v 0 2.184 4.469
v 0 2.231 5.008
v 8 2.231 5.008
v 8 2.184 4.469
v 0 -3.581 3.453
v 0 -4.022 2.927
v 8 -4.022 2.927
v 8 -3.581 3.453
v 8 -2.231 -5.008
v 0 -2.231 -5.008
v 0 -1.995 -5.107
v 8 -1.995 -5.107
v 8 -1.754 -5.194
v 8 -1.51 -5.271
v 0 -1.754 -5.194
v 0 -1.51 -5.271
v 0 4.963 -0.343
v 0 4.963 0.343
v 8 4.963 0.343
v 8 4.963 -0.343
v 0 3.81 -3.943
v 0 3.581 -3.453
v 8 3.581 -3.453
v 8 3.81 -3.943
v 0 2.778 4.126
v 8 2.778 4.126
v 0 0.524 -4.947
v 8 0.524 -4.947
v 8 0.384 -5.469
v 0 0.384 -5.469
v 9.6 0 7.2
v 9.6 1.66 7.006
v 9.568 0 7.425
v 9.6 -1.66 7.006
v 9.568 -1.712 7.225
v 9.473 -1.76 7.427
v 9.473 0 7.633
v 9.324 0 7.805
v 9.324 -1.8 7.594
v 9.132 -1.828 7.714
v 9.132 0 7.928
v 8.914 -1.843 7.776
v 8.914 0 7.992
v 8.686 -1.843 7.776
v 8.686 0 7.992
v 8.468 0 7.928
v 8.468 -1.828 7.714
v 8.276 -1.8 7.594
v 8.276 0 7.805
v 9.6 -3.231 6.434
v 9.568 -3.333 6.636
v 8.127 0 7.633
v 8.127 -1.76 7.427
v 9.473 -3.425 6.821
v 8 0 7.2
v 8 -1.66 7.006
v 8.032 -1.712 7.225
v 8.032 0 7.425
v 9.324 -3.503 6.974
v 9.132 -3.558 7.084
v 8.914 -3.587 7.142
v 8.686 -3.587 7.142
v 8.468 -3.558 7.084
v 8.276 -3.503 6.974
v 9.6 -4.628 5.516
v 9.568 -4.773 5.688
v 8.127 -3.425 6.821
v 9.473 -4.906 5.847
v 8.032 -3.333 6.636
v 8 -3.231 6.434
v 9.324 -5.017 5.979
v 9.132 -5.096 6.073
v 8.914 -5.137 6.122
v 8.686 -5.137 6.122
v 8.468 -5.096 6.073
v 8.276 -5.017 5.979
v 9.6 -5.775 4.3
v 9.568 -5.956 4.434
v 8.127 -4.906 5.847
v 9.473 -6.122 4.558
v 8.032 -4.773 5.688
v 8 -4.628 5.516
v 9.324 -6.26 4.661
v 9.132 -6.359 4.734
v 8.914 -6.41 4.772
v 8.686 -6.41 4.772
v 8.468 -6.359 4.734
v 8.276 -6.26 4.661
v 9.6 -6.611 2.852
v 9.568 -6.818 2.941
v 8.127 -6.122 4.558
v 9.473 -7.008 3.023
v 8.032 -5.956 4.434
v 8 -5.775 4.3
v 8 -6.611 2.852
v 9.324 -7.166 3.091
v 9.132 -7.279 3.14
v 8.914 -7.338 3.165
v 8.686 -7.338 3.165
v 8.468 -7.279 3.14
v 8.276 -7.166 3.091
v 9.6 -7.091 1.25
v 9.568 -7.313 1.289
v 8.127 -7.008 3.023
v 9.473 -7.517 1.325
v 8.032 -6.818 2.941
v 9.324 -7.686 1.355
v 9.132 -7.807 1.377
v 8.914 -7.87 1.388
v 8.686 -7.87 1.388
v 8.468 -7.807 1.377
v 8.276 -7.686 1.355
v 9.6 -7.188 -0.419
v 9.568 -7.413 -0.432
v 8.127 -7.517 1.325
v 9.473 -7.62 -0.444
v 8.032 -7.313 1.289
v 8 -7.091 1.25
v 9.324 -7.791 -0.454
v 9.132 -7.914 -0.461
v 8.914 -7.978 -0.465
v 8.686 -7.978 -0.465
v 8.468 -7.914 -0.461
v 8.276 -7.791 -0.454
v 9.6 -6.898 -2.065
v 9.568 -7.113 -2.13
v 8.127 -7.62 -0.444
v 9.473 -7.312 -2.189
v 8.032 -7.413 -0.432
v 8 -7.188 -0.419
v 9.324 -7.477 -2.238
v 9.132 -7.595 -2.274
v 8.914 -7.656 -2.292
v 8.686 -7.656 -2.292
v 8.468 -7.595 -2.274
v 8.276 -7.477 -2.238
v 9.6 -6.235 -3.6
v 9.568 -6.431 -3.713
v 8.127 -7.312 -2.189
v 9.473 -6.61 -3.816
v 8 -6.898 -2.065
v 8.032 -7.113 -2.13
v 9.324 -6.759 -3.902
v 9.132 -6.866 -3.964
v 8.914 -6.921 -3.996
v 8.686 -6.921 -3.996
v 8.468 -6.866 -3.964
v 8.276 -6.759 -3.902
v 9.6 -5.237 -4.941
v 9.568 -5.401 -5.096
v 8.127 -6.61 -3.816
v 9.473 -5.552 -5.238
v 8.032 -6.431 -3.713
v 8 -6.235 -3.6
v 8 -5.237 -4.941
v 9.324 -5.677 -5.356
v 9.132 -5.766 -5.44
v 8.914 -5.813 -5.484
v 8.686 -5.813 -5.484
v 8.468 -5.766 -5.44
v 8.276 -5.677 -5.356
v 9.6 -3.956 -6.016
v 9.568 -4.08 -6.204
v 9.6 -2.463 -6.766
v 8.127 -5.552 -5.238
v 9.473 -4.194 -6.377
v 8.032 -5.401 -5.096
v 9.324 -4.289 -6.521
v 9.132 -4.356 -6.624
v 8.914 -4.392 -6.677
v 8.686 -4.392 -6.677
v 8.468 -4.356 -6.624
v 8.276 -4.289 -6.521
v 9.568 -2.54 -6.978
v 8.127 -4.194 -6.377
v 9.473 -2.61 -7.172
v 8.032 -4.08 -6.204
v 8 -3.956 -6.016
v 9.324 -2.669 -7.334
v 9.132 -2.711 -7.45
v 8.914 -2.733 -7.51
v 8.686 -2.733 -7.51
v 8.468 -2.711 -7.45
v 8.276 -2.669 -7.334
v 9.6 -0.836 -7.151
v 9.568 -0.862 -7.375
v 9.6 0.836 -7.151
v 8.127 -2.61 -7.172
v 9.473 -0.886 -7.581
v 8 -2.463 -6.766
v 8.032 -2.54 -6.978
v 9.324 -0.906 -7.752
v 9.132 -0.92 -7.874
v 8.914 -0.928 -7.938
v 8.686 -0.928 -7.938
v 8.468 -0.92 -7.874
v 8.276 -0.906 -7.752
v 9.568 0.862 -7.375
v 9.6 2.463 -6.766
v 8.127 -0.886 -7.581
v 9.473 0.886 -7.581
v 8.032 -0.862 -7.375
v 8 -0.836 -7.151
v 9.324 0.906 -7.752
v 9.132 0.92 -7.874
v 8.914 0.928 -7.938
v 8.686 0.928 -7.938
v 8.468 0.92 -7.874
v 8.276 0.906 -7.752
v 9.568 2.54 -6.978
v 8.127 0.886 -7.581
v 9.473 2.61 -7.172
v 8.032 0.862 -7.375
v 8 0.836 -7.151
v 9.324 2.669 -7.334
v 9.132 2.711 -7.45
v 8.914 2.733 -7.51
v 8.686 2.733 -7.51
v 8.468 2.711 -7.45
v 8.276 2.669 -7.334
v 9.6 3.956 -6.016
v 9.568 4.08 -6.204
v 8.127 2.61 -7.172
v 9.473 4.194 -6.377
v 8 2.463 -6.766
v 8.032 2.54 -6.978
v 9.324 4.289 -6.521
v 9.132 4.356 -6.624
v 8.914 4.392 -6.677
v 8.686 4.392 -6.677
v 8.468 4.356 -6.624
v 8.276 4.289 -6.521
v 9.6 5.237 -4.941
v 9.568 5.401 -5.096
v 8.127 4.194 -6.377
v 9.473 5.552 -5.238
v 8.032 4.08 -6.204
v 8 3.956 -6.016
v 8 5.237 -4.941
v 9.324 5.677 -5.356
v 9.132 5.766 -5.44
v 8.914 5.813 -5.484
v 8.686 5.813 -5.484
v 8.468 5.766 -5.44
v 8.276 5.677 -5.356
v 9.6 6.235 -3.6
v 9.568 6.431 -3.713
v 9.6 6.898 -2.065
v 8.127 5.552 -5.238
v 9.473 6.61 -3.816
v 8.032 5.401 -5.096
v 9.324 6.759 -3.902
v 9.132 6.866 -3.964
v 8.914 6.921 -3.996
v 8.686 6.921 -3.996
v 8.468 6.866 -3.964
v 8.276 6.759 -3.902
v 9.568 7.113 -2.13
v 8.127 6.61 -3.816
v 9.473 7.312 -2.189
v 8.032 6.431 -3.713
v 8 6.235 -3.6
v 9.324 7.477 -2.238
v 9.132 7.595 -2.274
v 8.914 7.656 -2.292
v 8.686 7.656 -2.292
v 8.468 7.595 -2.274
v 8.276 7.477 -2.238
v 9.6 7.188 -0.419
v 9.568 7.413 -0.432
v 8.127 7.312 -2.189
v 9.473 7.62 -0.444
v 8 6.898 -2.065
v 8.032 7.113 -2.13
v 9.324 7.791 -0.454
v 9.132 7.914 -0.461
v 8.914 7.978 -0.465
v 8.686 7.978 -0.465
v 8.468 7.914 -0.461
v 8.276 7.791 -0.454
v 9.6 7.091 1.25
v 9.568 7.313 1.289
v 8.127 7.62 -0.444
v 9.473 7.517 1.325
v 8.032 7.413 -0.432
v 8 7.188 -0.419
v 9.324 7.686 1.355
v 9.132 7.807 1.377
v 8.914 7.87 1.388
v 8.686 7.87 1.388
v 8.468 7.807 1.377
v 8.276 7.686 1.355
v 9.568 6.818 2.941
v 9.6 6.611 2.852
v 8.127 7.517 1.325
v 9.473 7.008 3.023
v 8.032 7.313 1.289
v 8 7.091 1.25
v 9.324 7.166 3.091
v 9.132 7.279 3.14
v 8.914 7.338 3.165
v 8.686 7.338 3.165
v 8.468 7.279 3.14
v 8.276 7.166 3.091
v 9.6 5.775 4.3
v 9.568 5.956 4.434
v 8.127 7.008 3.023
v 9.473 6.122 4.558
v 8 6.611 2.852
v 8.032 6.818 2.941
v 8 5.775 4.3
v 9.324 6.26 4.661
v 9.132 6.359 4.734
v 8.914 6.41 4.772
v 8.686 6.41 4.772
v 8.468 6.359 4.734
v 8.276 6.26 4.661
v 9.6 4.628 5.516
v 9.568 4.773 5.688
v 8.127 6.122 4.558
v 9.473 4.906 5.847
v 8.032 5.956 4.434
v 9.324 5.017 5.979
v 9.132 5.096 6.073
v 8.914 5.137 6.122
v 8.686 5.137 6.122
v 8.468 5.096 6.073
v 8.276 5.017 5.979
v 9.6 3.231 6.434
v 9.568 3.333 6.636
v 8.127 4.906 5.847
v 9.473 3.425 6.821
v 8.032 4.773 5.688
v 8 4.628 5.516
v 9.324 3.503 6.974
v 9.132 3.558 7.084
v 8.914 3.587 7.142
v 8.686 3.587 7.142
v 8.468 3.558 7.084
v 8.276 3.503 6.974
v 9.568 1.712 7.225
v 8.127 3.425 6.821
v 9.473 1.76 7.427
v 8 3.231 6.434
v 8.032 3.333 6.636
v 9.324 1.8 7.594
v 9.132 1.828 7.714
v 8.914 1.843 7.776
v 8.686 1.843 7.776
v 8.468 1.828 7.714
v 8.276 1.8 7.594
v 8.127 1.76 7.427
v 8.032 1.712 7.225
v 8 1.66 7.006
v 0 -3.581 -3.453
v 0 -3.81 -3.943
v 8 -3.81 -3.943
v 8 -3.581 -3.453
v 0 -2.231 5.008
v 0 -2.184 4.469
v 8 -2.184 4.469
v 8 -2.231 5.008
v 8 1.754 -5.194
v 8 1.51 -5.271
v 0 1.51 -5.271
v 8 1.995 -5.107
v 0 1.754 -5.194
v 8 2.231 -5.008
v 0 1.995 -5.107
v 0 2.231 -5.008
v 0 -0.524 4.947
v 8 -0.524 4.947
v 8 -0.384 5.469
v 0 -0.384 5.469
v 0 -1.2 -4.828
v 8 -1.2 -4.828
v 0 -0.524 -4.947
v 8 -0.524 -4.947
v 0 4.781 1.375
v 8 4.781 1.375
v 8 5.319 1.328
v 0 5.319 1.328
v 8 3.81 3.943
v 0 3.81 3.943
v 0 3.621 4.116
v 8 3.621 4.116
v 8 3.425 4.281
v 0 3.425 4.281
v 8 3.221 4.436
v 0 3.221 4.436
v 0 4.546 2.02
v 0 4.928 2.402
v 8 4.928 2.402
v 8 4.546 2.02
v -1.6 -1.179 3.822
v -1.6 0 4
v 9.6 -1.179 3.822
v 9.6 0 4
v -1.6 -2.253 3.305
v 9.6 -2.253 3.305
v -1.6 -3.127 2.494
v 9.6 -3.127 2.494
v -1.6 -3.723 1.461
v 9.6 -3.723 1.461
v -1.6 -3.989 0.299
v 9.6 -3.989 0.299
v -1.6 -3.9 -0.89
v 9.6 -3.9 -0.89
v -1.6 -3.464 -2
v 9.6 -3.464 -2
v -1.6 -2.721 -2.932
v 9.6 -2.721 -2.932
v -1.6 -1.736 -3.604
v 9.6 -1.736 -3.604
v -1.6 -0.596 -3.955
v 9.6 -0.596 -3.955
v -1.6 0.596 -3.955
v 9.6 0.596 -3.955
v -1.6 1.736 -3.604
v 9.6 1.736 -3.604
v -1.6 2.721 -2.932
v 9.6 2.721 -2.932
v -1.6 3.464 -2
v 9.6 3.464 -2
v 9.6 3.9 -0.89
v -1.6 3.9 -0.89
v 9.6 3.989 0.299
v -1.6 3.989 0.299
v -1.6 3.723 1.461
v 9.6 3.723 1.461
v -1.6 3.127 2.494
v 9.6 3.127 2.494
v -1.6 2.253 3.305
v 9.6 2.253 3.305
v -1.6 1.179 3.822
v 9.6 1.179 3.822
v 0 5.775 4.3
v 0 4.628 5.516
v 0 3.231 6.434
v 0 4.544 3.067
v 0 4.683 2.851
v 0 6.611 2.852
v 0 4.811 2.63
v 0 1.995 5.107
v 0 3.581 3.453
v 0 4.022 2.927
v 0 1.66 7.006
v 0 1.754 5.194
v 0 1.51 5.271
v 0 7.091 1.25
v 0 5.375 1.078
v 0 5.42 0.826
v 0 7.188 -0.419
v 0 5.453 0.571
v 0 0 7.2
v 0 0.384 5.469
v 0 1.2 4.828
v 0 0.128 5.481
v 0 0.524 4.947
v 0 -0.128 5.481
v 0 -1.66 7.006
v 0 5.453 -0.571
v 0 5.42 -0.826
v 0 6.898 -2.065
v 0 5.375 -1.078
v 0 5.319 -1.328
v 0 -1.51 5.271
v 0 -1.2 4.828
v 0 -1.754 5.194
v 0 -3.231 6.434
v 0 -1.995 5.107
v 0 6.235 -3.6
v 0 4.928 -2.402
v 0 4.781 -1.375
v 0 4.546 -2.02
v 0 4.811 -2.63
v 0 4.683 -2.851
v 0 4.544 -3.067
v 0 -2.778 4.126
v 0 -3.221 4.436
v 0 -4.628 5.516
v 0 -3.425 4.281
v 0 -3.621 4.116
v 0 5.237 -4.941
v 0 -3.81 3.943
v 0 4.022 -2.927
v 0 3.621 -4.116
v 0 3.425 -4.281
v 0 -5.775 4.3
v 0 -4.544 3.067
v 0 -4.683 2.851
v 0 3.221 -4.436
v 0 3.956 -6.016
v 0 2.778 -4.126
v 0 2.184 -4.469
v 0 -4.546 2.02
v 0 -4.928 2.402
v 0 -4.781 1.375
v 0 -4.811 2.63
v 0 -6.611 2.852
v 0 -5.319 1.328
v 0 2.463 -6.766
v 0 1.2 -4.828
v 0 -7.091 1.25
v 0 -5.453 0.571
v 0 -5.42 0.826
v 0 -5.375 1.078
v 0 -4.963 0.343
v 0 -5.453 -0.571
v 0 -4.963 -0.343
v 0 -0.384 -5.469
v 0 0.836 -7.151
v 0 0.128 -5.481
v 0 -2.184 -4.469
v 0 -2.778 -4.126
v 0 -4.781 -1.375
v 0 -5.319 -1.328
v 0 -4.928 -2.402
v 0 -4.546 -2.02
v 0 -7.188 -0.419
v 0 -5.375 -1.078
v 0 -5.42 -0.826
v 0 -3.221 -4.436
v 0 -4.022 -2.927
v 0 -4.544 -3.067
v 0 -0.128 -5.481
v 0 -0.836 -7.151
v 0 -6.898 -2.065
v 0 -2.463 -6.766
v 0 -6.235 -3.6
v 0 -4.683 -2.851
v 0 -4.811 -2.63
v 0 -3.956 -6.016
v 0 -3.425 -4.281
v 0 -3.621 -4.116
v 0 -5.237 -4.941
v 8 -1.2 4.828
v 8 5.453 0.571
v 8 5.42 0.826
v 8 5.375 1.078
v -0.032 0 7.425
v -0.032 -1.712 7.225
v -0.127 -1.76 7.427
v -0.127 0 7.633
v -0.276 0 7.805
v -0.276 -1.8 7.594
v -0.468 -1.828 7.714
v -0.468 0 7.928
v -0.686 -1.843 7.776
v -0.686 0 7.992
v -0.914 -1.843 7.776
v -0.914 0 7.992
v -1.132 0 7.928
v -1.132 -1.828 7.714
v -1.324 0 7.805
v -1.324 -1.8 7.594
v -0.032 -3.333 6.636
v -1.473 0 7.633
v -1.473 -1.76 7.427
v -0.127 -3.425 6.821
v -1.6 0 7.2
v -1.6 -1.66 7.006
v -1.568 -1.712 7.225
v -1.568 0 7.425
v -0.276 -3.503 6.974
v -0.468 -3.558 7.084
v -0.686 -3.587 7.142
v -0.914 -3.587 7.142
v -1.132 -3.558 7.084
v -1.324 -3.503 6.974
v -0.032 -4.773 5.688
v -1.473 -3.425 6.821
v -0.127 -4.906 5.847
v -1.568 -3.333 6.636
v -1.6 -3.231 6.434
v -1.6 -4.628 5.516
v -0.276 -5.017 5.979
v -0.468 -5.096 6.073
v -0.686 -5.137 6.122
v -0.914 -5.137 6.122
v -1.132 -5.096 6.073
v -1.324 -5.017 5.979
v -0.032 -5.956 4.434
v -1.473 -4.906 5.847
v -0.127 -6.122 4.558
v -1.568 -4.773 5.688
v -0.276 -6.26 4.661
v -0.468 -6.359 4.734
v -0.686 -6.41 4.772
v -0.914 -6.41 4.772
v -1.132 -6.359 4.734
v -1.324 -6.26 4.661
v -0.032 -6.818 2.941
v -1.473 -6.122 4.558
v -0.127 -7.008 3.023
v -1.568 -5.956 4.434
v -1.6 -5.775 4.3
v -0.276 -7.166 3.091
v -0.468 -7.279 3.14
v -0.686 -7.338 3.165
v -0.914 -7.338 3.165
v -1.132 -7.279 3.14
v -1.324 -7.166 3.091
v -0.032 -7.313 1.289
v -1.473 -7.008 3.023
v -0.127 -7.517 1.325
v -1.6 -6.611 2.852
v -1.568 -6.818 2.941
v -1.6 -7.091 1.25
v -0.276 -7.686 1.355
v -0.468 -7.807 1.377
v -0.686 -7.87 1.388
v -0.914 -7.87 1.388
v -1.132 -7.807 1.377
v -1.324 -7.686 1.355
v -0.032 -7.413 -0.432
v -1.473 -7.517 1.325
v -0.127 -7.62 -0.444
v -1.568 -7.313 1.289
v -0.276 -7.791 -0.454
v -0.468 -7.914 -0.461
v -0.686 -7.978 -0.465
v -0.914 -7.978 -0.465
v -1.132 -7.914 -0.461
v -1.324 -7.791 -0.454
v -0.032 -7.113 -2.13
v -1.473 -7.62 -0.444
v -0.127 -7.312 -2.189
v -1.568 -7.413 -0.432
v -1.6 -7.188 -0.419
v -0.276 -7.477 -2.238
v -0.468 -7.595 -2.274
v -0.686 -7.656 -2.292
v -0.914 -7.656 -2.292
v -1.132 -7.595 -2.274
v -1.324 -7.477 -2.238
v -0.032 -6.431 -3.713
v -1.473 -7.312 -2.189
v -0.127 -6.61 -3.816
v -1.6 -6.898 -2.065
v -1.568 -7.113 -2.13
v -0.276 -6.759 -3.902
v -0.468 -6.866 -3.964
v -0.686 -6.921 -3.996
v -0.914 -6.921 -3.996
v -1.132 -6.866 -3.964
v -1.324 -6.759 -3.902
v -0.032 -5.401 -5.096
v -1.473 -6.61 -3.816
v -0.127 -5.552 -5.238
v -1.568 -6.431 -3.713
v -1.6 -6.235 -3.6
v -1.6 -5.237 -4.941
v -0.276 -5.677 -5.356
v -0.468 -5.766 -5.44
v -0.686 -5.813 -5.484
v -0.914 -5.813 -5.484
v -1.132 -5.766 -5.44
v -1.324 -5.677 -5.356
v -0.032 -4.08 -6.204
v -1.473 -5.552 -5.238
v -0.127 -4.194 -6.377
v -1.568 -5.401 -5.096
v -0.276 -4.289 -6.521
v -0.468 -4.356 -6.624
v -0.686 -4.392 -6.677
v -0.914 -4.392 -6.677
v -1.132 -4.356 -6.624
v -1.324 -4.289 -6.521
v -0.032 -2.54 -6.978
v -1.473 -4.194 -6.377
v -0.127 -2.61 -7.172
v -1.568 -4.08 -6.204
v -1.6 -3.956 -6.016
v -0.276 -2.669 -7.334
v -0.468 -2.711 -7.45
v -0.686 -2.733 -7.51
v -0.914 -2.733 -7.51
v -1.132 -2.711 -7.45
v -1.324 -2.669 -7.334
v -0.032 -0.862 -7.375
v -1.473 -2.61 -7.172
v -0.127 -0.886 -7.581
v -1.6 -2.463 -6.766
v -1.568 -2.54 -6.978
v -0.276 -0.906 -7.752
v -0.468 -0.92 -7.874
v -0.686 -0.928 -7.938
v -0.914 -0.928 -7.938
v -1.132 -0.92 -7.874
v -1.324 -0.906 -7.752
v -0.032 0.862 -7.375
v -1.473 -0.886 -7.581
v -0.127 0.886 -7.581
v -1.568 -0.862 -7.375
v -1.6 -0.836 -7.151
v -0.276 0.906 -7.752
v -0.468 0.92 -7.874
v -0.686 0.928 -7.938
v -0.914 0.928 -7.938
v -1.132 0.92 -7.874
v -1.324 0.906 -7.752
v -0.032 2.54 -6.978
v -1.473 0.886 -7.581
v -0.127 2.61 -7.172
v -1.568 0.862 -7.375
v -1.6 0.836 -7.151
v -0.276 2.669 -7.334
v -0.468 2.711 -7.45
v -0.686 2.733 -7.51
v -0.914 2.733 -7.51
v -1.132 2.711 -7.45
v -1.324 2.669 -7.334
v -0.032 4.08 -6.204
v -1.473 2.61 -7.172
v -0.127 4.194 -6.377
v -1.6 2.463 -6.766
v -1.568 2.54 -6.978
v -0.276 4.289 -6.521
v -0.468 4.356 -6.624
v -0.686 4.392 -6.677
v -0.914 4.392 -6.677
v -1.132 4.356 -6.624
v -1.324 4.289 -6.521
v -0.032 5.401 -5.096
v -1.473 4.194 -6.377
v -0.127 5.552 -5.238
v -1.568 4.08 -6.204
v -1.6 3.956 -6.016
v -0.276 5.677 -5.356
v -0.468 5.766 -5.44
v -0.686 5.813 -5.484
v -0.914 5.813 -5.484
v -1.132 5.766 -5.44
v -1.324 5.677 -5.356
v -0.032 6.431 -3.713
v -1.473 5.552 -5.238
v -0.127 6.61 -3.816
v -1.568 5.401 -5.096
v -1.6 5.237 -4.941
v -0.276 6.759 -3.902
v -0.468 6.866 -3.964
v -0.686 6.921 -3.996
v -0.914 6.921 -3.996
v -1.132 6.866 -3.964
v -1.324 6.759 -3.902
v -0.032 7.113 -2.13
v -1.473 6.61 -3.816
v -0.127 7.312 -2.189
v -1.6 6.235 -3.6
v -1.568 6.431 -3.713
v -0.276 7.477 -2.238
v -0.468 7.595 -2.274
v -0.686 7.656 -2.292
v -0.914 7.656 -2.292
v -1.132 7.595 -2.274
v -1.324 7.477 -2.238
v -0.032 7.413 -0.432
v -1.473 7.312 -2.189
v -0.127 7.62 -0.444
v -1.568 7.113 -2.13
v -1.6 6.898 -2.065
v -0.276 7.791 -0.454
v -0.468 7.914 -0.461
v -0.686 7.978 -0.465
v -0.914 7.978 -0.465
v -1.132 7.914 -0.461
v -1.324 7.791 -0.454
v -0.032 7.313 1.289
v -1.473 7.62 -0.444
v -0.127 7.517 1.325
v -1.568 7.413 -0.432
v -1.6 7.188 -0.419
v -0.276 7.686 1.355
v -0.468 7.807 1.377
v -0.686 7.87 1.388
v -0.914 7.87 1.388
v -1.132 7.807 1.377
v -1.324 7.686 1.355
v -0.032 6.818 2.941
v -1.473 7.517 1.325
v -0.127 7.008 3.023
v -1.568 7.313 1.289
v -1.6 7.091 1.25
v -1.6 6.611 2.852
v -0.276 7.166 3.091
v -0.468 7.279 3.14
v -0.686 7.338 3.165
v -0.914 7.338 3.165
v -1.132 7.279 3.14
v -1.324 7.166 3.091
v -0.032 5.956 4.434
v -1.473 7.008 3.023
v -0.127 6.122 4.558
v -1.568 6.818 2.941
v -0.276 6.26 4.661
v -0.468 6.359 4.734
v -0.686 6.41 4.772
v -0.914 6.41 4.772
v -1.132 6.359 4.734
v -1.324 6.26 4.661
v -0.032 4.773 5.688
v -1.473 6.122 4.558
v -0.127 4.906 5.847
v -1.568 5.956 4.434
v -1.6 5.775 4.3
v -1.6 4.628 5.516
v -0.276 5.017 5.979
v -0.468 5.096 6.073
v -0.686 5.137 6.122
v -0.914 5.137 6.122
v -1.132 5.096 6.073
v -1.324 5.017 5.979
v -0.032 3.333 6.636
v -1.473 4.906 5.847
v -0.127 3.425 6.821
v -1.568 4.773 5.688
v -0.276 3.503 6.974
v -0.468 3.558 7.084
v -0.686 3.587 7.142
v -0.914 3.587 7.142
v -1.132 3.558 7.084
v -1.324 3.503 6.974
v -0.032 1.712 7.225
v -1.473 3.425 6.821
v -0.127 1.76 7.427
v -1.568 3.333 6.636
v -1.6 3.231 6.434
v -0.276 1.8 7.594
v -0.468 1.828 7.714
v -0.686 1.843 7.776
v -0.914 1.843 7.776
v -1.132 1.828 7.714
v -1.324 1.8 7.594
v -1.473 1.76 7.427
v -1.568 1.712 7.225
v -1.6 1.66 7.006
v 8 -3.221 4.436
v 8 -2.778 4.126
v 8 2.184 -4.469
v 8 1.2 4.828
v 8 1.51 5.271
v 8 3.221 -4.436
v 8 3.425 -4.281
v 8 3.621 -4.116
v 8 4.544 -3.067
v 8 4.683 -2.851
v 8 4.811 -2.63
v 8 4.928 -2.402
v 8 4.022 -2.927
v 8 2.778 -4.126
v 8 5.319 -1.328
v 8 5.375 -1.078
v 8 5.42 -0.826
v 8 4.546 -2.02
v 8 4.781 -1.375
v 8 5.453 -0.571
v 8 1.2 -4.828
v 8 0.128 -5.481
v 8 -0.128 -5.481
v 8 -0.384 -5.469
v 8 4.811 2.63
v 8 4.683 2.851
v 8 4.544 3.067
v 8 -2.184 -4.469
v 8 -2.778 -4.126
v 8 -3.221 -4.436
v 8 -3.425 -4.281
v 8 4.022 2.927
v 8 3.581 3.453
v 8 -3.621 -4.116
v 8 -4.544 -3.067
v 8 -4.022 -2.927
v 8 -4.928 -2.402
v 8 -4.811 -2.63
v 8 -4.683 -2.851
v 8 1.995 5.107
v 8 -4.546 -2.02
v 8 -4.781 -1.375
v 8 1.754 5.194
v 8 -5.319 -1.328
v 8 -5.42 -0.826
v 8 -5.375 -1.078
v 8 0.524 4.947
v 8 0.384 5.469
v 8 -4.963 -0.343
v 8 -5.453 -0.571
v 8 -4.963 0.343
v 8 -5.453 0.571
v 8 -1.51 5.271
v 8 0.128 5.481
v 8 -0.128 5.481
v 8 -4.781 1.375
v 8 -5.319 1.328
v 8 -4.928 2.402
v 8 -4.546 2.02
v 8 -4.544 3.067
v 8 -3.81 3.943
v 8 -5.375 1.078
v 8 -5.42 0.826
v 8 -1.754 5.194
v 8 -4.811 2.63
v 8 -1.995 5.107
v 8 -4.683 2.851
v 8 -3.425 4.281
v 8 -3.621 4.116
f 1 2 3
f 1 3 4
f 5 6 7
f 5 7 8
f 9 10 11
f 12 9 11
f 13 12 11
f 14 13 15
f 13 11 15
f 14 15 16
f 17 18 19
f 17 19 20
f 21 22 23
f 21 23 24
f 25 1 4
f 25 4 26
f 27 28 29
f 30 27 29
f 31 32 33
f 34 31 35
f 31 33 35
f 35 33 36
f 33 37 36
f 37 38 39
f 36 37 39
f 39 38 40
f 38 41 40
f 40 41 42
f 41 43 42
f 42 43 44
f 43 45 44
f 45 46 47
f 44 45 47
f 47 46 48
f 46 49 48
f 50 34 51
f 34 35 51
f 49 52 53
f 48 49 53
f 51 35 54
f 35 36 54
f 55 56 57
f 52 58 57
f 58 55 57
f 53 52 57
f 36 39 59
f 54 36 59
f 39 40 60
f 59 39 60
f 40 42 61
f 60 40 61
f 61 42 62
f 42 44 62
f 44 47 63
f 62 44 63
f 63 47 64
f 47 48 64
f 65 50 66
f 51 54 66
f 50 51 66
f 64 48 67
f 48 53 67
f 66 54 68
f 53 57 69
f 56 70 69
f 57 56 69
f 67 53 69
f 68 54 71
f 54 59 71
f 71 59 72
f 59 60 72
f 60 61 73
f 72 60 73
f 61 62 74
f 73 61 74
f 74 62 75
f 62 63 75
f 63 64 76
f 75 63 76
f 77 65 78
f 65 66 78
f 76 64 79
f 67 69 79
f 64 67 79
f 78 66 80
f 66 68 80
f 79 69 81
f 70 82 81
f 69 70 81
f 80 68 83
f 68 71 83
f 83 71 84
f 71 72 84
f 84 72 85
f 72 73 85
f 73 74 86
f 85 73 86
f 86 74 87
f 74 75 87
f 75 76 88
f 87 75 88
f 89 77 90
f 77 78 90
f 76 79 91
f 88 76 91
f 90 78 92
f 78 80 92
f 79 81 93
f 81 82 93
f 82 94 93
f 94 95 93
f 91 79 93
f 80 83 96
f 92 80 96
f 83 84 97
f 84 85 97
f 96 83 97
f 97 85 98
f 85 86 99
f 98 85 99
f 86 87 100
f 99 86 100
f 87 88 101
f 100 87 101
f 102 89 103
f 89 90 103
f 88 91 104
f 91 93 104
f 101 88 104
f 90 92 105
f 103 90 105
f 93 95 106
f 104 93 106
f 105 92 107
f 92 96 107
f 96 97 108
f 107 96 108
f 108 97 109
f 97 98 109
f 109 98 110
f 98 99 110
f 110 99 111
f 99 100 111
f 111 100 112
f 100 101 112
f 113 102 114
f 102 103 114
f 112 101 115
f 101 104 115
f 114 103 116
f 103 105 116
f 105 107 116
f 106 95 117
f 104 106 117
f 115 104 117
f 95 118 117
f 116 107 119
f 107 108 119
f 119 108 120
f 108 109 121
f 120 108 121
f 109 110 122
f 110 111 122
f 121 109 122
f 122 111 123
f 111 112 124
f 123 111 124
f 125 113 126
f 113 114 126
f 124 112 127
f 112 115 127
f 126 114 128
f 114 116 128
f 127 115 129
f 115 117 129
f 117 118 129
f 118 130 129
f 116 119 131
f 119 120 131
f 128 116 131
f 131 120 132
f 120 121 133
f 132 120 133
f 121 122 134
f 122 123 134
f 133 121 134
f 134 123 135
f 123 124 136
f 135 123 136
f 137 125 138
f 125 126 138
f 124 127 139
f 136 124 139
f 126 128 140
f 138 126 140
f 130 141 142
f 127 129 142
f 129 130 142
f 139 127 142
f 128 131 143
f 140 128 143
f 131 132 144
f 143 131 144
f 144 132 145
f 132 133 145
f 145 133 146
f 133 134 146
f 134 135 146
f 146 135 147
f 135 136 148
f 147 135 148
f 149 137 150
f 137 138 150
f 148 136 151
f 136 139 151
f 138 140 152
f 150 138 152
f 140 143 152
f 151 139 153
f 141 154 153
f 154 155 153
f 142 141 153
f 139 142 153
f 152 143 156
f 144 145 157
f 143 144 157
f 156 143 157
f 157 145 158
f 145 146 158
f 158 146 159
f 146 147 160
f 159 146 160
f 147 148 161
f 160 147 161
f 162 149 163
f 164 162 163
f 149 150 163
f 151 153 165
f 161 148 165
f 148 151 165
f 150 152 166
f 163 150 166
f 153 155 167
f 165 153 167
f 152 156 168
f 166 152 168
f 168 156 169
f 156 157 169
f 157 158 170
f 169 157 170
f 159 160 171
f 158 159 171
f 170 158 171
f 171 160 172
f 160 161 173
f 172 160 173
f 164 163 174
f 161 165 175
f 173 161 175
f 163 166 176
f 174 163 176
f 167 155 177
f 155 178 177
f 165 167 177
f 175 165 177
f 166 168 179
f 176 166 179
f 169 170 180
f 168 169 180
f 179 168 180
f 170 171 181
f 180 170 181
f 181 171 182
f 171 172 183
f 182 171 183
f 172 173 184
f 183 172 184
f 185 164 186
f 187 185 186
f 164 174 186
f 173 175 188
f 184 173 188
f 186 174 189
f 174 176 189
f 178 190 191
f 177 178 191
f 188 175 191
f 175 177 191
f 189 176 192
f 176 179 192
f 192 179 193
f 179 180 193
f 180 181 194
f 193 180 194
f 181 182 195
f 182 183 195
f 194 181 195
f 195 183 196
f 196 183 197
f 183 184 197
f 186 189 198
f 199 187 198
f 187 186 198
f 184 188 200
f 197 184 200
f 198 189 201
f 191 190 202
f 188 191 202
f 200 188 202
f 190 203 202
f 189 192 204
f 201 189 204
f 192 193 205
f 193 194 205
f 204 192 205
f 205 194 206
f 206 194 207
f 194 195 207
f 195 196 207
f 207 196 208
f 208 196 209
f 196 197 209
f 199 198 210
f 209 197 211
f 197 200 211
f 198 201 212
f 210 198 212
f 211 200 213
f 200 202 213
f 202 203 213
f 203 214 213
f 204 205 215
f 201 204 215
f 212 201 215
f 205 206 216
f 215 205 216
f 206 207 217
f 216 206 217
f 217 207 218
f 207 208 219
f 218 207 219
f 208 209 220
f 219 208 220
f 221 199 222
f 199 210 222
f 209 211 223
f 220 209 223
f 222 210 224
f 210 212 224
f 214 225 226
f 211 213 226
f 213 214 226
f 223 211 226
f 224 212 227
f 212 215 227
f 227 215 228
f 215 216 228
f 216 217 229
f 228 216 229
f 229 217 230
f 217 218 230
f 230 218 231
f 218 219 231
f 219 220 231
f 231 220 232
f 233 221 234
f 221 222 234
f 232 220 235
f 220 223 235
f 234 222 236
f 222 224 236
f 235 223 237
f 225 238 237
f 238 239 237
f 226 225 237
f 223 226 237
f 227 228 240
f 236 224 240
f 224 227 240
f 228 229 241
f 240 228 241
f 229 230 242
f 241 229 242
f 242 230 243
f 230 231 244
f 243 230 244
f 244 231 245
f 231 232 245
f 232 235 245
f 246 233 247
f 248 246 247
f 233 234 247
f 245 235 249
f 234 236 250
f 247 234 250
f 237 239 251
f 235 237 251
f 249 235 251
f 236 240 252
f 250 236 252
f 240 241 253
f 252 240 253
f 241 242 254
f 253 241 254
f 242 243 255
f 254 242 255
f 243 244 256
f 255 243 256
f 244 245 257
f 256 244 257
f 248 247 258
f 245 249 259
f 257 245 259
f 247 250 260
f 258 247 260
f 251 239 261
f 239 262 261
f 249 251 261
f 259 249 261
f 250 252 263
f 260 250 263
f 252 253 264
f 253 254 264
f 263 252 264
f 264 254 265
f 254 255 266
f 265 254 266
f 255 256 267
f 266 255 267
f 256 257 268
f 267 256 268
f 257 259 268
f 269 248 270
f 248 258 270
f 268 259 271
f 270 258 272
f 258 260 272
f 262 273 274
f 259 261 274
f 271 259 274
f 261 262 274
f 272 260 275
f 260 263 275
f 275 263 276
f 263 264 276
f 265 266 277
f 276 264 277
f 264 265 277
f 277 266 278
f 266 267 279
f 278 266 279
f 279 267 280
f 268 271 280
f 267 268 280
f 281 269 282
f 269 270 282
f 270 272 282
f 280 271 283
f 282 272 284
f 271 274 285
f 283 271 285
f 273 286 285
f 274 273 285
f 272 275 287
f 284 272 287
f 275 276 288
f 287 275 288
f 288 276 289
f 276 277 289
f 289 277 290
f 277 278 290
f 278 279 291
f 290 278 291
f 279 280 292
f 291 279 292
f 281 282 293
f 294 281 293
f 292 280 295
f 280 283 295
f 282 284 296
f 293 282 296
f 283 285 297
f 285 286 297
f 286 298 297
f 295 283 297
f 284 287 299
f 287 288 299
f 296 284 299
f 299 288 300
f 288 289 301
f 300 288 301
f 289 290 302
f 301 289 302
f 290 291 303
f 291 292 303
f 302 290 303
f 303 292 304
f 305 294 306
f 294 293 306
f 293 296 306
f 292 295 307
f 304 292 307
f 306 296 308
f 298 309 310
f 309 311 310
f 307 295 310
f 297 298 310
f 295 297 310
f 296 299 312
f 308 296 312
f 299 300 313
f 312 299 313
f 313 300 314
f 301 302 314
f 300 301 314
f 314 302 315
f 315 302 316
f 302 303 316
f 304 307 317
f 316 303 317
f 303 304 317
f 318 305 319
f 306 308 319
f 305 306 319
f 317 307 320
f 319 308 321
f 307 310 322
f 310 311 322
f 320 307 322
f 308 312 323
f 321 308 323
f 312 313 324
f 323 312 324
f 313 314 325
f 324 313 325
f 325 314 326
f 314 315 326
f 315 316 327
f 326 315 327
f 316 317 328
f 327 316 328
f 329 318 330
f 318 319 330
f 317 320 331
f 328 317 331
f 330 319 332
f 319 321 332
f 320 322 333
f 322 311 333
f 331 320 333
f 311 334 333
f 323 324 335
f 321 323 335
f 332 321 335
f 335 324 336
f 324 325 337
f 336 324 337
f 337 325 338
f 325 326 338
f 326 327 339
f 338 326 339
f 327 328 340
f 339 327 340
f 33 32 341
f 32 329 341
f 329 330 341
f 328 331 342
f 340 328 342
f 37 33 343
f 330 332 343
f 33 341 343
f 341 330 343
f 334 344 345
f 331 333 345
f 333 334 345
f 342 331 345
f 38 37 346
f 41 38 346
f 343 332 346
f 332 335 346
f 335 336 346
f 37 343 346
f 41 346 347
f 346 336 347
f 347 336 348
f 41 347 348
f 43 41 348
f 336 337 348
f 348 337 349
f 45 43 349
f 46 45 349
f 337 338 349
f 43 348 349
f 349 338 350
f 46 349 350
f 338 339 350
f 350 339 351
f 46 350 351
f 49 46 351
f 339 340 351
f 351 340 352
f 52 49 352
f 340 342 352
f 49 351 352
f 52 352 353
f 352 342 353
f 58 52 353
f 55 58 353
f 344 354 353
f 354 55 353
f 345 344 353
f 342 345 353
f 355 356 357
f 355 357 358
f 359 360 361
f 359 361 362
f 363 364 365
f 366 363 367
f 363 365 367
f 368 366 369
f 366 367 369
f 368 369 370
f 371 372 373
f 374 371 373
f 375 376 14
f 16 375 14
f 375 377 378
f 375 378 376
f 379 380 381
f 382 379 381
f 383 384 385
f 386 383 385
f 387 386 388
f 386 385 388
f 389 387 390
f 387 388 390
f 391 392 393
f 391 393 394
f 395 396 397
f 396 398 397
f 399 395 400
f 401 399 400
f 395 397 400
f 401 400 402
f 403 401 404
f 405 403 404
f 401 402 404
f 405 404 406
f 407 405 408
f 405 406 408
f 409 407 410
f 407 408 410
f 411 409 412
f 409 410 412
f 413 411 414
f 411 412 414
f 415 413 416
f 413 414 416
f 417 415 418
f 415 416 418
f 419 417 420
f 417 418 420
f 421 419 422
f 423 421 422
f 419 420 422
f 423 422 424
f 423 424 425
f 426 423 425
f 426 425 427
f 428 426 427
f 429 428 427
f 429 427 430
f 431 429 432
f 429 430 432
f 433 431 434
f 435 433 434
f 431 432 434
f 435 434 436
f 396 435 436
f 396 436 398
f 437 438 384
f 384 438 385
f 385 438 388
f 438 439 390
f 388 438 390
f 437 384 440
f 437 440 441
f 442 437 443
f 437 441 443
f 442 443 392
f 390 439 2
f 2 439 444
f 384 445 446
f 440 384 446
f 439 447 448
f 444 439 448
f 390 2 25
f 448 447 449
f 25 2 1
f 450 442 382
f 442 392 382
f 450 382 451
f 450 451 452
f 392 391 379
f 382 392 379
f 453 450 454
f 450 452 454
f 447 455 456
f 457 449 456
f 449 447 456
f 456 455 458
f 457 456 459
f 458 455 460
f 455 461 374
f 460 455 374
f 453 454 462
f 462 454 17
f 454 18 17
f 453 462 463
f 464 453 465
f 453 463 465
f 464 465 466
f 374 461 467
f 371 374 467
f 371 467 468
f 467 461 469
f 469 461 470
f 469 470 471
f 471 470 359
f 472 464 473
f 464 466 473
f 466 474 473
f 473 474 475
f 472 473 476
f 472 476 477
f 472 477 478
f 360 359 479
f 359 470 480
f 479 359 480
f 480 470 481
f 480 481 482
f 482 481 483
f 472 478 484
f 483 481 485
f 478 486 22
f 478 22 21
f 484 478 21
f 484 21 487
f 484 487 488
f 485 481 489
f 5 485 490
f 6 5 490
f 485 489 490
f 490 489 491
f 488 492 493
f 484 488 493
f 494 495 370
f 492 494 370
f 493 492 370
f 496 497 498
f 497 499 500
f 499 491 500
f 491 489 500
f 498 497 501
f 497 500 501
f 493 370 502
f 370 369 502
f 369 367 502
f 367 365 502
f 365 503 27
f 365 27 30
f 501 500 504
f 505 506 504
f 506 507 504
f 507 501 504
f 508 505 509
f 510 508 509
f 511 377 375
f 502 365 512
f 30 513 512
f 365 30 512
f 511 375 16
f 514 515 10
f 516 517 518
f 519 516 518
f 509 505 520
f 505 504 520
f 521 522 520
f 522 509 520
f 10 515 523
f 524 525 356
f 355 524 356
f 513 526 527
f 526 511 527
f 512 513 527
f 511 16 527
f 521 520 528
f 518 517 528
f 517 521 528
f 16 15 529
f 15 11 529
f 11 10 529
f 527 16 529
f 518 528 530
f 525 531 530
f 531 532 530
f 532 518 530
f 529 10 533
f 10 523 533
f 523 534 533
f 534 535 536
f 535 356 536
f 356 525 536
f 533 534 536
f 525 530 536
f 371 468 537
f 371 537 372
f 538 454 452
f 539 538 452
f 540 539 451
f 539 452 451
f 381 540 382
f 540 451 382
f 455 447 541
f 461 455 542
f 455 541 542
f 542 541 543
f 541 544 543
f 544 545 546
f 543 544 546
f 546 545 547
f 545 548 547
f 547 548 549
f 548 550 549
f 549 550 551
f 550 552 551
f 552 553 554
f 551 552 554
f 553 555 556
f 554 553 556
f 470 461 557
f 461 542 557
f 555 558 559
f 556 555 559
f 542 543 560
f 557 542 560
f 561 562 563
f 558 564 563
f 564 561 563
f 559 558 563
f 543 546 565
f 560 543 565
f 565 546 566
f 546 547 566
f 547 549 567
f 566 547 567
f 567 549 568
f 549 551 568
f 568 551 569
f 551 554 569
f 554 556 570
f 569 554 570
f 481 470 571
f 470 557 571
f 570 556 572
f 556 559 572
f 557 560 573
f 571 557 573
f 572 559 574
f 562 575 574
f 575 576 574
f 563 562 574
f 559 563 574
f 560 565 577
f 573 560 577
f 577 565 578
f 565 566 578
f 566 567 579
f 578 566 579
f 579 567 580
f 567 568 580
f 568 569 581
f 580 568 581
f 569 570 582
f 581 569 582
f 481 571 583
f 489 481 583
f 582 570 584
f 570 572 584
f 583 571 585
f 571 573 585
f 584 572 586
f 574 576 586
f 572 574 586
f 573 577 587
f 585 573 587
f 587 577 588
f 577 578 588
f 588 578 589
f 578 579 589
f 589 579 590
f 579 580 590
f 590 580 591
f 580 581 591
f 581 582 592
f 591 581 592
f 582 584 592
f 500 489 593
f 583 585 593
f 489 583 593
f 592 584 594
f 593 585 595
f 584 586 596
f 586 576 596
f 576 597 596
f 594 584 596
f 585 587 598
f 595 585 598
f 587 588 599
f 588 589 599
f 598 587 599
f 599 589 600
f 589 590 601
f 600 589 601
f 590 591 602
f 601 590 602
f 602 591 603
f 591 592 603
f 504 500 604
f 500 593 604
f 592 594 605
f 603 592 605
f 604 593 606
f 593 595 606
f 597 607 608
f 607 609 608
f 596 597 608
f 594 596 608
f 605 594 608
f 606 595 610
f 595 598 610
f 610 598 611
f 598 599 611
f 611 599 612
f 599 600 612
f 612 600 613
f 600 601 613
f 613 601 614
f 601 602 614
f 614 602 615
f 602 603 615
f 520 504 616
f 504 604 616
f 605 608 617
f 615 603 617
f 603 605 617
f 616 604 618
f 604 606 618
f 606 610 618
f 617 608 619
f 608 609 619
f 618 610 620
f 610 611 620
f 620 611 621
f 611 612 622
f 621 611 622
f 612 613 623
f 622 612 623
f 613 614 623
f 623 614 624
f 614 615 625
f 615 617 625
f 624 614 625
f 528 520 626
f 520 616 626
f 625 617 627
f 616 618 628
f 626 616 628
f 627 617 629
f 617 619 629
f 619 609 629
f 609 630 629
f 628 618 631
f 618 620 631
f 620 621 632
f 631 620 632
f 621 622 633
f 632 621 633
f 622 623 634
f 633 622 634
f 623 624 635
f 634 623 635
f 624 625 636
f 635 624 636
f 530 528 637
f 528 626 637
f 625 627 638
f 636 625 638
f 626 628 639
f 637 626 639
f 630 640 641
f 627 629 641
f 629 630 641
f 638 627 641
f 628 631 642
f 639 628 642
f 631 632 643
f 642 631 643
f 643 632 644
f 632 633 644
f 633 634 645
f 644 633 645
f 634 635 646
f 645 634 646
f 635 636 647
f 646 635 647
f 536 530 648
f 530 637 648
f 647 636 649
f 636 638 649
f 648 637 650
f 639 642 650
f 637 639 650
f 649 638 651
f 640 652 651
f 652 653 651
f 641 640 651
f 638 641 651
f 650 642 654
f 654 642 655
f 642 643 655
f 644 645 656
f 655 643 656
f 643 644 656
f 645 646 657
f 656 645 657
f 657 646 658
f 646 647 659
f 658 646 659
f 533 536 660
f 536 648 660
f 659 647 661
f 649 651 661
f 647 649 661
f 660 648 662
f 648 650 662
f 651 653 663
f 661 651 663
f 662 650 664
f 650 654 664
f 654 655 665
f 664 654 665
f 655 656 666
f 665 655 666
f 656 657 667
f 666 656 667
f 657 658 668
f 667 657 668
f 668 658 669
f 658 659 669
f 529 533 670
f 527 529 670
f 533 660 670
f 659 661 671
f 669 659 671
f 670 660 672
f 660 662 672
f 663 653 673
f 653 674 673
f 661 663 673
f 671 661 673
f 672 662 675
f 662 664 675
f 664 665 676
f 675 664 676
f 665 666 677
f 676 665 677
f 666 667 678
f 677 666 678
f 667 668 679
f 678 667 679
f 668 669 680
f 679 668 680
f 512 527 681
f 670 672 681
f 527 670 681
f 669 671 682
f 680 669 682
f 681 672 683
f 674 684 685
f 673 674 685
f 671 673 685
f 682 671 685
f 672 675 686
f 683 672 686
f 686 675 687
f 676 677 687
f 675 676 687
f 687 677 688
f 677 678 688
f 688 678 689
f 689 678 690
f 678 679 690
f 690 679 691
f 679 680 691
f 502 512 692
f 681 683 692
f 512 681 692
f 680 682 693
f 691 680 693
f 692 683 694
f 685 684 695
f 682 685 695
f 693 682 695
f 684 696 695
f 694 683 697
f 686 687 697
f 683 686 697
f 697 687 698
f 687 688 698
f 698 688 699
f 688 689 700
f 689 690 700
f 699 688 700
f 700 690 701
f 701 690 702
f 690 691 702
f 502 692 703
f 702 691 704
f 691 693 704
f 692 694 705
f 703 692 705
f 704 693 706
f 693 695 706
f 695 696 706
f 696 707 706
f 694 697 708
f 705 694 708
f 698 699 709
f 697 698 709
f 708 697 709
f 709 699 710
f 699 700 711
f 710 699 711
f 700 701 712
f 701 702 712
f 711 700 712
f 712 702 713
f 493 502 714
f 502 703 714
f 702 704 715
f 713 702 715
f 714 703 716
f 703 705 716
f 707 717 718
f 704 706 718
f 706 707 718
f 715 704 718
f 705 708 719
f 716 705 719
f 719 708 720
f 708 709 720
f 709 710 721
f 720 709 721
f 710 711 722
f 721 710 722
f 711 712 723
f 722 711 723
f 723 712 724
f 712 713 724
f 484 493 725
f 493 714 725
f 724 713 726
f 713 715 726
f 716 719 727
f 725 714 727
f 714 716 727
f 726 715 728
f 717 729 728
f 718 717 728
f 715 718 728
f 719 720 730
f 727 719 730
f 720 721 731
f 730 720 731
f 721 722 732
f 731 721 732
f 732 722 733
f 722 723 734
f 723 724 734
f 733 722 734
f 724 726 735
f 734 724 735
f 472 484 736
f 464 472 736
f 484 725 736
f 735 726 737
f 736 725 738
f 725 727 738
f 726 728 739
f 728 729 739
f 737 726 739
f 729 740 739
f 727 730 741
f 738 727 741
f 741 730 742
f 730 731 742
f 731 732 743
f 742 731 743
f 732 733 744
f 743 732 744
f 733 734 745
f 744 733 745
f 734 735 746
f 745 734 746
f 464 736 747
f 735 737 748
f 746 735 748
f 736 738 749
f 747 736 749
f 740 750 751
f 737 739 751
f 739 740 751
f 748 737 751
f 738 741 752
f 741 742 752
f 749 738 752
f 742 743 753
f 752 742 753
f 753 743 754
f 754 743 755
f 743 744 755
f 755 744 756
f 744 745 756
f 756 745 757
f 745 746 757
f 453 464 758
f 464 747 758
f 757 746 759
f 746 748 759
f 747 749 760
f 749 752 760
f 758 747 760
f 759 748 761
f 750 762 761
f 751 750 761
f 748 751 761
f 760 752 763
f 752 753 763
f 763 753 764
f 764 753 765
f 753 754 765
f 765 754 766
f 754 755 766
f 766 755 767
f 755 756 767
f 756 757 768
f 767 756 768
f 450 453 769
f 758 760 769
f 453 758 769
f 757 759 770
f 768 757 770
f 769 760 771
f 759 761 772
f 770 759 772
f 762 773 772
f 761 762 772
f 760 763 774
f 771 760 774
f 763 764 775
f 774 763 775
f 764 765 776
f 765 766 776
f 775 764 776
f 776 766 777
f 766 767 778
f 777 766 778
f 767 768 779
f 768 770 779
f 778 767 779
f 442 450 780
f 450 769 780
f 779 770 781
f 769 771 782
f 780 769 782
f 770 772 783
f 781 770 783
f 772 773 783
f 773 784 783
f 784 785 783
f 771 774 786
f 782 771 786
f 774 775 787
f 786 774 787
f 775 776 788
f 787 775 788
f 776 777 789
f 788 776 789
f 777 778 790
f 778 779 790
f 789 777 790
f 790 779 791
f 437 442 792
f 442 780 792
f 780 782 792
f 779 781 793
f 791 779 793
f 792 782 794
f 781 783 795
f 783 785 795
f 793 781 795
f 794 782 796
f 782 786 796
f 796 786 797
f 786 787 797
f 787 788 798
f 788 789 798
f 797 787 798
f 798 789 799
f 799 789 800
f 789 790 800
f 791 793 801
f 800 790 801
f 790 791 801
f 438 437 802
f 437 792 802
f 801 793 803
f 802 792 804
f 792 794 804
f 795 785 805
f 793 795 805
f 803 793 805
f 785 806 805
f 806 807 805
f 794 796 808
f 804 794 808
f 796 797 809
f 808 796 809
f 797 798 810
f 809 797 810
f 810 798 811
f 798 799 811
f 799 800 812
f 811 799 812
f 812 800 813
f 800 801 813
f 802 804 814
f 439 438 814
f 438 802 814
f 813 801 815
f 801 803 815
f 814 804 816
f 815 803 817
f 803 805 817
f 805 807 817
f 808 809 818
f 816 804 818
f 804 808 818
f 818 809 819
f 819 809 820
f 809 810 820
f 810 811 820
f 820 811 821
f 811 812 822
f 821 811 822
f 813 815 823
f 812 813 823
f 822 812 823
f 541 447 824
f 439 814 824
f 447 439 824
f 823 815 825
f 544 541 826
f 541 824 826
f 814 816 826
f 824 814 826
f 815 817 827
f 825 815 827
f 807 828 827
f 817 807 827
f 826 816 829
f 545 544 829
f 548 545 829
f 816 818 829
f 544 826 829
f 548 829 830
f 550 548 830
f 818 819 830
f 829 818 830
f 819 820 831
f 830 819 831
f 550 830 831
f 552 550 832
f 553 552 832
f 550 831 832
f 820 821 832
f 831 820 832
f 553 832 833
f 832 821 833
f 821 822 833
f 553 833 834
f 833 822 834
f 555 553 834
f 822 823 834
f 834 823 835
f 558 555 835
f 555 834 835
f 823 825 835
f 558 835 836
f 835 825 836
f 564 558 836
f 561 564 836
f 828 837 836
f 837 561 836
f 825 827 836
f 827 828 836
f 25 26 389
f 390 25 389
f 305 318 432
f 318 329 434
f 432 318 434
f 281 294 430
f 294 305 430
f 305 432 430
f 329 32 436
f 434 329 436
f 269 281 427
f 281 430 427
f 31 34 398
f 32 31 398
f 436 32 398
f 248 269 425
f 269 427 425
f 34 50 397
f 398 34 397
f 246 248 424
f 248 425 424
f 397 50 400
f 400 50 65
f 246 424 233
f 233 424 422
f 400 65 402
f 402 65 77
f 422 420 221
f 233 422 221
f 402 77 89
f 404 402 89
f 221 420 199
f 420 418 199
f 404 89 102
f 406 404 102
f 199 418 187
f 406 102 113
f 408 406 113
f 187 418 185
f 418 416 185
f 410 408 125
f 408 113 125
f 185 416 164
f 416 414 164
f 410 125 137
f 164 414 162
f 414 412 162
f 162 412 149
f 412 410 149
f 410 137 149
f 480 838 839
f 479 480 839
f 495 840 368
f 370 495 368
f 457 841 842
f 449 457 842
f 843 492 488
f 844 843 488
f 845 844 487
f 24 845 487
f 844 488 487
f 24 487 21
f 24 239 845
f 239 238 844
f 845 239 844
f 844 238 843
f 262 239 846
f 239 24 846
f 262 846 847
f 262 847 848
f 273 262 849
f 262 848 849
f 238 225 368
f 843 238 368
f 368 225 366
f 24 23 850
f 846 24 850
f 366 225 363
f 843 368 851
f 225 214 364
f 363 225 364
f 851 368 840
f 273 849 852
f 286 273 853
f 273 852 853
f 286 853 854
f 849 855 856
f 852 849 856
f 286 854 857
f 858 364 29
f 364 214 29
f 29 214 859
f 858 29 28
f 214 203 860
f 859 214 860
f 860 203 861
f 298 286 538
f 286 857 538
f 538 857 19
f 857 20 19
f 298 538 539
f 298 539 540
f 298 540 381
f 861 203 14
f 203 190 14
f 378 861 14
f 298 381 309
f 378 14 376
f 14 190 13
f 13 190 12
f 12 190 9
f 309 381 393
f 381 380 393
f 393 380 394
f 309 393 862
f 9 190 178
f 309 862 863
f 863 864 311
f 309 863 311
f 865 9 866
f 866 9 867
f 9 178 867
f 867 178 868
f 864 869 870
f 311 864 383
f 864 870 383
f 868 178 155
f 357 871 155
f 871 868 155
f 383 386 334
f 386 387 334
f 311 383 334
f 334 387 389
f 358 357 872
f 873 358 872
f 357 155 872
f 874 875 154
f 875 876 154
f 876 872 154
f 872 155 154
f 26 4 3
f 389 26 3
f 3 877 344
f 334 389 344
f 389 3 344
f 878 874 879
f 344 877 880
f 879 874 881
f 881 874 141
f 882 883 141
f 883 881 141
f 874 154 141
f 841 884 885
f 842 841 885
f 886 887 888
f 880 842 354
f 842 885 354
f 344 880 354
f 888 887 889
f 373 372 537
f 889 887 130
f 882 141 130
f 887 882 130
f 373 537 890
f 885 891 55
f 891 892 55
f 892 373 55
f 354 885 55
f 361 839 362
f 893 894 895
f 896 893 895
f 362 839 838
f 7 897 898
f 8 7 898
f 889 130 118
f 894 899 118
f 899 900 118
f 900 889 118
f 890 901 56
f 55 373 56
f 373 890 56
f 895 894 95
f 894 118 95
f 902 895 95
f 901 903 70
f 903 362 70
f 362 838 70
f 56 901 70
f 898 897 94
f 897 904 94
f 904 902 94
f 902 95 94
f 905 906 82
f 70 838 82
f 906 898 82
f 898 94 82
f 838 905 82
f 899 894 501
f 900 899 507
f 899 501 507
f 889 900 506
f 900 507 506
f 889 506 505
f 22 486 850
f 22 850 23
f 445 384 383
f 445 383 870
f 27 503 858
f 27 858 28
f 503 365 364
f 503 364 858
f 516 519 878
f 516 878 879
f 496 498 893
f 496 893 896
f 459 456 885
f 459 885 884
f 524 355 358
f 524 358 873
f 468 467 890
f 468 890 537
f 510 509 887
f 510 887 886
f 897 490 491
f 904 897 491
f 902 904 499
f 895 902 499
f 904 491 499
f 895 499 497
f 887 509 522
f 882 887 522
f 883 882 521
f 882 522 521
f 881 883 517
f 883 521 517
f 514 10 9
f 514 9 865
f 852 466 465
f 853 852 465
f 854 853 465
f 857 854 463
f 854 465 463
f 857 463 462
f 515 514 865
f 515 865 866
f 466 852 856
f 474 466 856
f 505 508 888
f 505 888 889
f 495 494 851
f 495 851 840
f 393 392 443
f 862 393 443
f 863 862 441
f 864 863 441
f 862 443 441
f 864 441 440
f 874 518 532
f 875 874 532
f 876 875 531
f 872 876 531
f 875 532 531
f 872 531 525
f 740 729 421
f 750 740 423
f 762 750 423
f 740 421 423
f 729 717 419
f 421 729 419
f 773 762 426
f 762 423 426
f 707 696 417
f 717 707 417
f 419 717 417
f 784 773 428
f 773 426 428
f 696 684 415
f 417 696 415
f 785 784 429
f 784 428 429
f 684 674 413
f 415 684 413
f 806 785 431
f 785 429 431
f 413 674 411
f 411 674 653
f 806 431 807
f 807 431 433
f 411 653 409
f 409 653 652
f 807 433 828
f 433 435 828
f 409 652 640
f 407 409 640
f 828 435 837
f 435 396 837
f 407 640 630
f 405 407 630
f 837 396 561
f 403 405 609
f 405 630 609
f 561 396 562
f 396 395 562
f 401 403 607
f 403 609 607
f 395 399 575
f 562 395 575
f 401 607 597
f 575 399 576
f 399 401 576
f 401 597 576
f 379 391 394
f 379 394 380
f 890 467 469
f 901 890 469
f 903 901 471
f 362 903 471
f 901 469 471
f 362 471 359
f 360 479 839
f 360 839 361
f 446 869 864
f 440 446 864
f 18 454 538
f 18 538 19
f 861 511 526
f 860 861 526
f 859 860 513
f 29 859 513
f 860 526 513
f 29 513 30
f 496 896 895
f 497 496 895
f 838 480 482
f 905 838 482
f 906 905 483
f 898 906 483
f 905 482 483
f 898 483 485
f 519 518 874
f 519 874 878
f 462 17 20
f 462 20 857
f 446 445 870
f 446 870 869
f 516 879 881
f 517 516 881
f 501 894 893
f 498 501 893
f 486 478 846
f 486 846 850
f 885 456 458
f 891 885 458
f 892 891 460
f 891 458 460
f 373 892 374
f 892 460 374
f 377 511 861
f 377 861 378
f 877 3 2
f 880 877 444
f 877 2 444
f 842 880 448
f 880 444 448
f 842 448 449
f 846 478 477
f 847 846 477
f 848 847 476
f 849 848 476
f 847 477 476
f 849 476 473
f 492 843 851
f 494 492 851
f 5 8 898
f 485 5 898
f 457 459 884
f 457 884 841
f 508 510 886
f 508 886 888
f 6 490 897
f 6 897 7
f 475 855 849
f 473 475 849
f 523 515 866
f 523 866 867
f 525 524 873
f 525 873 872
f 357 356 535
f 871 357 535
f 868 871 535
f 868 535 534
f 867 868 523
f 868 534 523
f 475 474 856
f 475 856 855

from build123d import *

# Parameters (mm, degrees)
SKETCH4_R          = 5.8
SKETCH4_R_2        = 5.4825
CUT_EXTRUDE2_DEPTH = 8
CUT_EXTRUDE1_DEPTH = 8
CIRPATTERN1_COUNT  = 18


with BuildPart() as part:
    # Sketch1 → Revolve1 (revolve)
    with BuildSketch(Plane.XY, mode=Mode.PRIVATE) as revolve1_sk:
        with BuildLine():
            Line((-1.6, 4), (9.6, 4))
            Line((9.6, 4), (9.6, 7.2))
            ThreePointArc((9.6, 7.2), (8.8, 8), (8, 7.2))
            Line((8, 7.2), (8, 5.55))
            Line((8, 5.55), (0, 5.55))
            Line((0, 5.55), (0, 7.2))
            ThreePointArc((0, 7.2), (-0.8, 8), (-1.6, 7.2))
            Line((-1.6, 7.2), (-1.6, 4))
        make_face()
    revolve(revolve1_sk.sketch.rotate(Axis((-1.6, 0, 0), (1, 0, 0)), 90), axis=Axis((-1.6, 0, 0), (1, 0, 0)))

    # Sketch4 → Cut-Extrude2 (cut)
    with BuildSketch(Plane(origin=(0, 0, 0), x_dir=(0, 0, -1), z_dir=(1, 0, 0))):
        Circle(SKETCH4_R)
        Circle(SKETCH4_R_2, mode=Mode.SUBTRACT)
    extrude(amount=CUT_EXTRUDE2_DEPTH, mode=Mode.SUBTRACT)

    # Sketch3 → Cut-Extrude1 (cut)
    with BuildSketch(Plane(origin=(0, 0, 0), x_dir=(0, 0, -1), z_dir=(1, 0, 0))):
        with BuildLine():
            Line((-0.642345316, 5.604560113), (-0.343021997, 4.962659182))
            Line((-0.343021997, 4.962659182), (0.343021997, 4.962659182))
            Line((0.343021997, 4.962659182), (0.642345316, 5.604560113))
            ThreePointArc((0.642345316, 5.604560113), (0, 5.64125), (-0.642345316, 5.604560113))
        make_face()
    cut_extrude1 = extrude(amount=CUT_EXTRUDE1_DEPTH, mode=Mode.SUBTRACT)

    # CirPattern1: Cut-Extrude1 ×18 about axis
    cirpattern1_axis = Axis((0, 0, 0), (1, 0, 0))
    for i in range(1, CIRPATTERN1_COUNT):
        add(cut_extrude1.rotate(cirpattern1_axis, i * 360 / CIRPATTERN1_COUNT), mode=Mode.SUBTRACT)


solid = part.part
